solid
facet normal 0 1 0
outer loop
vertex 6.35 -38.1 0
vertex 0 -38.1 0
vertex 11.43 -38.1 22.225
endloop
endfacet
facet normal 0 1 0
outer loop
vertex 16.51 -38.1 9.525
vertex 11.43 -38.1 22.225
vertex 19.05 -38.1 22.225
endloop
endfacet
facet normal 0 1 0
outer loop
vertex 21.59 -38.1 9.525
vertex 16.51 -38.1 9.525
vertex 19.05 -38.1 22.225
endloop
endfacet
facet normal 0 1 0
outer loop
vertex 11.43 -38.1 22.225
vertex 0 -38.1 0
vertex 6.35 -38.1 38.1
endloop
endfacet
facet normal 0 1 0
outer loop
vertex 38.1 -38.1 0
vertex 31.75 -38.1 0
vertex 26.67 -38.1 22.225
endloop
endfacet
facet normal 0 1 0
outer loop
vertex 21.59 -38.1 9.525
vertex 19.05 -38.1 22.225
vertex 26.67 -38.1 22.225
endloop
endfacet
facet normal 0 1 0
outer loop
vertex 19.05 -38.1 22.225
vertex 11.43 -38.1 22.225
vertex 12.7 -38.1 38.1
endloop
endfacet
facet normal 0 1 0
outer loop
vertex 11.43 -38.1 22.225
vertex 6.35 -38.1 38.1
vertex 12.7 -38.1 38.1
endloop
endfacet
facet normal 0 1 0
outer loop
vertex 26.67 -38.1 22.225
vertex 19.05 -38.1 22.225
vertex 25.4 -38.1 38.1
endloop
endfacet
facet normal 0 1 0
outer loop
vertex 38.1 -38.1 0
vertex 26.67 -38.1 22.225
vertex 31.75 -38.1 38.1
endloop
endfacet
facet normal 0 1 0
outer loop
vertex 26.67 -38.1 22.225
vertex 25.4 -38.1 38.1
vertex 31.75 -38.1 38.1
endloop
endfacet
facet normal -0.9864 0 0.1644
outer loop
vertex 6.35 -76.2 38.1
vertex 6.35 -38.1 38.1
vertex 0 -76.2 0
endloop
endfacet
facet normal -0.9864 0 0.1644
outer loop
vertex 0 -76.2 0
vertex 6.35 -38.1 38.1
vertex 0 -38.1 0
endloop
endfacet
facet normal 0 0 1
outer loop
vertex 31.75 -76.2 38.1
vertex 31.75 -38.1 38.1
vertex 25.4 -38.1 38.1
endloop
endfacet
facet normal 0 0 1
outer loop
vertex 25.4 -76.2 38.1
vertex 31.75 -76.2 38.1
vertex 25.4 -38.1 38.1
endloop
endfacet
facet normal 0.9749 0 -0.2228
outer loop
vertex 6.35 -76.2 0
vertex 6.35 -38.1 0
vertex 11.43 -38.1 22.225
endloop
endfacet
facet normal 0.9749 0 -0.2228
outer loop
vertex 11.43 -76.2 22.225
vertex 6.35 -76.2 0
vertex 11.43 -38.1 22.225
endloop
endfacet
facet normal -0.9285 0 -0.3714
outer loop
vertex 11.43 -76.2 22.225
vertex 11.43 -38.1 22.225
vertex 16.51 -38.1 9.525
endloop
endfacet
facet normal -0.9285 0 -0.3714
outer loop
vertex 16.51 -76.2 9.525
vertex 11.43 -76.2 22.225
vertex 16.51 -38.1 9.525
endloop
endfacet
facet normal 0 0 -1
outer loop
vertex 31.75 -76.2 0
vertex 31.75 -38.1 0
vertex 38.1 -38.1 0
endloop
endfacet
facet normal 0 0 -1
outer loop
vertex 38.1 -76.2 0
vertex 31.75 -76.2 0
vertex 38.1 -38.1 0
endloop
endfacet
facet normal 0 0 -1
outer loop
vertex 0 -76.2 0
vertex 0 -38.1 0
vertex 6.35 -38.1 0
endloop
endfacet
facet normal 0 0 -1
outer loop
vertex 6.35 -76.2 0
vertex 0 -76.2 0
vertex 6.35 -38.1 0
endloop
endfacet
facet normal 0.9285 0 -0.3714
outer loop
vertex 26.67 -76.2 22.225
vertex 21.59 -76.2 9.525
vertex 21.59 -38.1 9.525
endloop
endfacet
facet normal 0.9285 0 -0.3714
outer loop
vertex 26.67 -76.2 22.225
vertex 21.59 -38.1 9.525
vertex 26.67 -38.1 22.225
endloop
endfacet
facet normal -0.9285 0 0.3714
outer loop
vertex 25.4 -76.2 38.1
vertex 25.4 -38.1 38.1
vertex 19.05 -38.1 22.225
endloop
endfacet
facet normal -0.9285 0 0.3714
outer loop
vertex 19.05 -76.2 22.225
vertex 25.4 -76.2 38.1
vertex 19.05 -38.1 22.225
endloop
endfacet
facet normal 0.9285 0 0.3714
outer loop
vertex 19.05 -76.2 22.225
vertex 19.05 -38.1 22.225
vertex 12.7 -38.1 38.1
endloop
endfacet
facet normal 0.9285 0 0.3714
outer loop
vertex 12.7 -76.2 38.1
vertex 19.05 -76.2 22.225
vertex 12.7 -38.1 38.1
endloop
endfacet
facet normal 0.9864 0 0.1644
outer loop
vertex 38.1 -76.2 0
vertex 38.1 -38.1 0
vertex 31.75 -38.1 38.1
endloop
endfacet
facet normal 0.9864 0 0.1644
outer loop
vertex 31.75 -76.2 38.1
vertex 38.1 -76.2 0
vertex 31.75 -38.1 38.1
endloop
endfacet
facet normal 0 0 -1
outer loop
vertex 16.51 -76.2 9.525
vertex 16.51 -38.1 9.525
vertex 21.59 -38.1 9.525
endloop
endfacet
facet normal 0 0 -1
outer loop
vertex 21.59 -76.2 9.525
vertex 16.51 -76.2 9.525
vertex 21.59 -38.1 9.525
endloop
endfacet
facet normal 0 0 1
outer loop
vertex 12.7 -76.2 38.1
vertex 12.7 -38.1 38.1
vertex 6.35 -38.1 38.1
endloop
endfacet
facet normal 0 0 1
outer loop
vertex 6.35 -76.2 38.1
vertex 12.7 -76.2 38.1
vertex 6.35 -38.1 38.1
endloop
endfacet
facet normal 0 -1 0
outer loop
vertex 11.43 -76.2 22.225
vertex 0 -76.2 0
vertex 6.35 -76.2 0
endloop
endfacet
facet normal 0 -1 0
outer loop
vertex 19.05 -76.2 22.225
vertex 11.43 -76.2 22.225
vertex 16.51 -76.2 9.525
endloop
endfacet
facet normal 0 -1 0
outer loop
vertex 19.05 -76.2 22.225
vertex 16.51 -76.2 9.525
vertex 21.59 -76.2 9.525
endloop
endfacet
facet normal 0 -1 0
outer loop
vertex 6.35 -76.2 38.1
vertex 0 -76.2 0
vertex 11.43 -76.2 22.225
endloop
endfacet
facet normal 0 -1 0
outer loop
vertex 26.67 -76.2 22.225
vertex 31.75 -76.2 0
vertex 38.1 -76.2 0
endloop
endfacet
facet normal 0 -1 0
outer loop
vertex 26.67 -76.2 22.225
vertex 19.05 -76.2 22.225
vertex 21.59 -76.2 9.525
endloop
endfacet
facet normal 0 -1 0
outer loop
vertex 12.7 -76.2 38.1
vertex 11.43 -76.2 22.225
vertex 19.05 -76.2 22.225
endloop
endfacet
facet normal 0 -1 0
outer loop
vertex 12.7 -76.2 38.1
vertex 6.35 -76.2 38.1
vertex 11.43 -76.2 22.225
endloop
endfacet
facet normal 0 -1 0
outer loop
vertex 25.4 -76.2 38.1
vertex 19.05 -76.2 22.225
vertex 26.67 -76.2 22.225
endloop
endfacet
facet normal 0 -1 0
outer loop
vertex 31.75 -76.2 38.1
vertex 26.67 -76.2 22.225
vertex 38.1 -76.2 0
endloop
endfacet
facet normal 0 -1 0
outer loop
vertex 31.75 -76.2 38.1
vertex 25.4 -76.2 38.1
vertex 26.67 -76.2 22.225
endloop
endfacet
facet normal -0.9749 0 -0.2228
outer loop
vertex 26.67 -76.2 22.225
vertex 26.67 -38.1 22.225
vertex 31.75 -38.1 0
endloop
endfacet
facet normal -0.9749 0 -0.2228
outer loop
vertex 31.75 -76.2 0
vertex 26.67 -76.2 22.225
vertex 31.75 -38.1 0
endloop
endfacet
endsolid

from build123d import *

# Parameters (mm, degrees)
F2_DEPTH = 38.1


with BuildPart() as f2:
    # F1 (on offset) → F2 (new body)
    with BuildSketch(Plane.XZ.offset(38.1)):
        Polygon((6.35, 38.1), (0, 0), (6.35, 0), (11.43, 22.225), (16.51, 9.525), (21.59, 9.525), (26.67, 22.225), (31.75, 0), (38.1, 0), (31.75, 38.1), (25.4, 38.1), (19.05, 22.225), (12.7, 38.1), align=None)
    extrude(amount=F2_DEPTH)


solid = f2.part
